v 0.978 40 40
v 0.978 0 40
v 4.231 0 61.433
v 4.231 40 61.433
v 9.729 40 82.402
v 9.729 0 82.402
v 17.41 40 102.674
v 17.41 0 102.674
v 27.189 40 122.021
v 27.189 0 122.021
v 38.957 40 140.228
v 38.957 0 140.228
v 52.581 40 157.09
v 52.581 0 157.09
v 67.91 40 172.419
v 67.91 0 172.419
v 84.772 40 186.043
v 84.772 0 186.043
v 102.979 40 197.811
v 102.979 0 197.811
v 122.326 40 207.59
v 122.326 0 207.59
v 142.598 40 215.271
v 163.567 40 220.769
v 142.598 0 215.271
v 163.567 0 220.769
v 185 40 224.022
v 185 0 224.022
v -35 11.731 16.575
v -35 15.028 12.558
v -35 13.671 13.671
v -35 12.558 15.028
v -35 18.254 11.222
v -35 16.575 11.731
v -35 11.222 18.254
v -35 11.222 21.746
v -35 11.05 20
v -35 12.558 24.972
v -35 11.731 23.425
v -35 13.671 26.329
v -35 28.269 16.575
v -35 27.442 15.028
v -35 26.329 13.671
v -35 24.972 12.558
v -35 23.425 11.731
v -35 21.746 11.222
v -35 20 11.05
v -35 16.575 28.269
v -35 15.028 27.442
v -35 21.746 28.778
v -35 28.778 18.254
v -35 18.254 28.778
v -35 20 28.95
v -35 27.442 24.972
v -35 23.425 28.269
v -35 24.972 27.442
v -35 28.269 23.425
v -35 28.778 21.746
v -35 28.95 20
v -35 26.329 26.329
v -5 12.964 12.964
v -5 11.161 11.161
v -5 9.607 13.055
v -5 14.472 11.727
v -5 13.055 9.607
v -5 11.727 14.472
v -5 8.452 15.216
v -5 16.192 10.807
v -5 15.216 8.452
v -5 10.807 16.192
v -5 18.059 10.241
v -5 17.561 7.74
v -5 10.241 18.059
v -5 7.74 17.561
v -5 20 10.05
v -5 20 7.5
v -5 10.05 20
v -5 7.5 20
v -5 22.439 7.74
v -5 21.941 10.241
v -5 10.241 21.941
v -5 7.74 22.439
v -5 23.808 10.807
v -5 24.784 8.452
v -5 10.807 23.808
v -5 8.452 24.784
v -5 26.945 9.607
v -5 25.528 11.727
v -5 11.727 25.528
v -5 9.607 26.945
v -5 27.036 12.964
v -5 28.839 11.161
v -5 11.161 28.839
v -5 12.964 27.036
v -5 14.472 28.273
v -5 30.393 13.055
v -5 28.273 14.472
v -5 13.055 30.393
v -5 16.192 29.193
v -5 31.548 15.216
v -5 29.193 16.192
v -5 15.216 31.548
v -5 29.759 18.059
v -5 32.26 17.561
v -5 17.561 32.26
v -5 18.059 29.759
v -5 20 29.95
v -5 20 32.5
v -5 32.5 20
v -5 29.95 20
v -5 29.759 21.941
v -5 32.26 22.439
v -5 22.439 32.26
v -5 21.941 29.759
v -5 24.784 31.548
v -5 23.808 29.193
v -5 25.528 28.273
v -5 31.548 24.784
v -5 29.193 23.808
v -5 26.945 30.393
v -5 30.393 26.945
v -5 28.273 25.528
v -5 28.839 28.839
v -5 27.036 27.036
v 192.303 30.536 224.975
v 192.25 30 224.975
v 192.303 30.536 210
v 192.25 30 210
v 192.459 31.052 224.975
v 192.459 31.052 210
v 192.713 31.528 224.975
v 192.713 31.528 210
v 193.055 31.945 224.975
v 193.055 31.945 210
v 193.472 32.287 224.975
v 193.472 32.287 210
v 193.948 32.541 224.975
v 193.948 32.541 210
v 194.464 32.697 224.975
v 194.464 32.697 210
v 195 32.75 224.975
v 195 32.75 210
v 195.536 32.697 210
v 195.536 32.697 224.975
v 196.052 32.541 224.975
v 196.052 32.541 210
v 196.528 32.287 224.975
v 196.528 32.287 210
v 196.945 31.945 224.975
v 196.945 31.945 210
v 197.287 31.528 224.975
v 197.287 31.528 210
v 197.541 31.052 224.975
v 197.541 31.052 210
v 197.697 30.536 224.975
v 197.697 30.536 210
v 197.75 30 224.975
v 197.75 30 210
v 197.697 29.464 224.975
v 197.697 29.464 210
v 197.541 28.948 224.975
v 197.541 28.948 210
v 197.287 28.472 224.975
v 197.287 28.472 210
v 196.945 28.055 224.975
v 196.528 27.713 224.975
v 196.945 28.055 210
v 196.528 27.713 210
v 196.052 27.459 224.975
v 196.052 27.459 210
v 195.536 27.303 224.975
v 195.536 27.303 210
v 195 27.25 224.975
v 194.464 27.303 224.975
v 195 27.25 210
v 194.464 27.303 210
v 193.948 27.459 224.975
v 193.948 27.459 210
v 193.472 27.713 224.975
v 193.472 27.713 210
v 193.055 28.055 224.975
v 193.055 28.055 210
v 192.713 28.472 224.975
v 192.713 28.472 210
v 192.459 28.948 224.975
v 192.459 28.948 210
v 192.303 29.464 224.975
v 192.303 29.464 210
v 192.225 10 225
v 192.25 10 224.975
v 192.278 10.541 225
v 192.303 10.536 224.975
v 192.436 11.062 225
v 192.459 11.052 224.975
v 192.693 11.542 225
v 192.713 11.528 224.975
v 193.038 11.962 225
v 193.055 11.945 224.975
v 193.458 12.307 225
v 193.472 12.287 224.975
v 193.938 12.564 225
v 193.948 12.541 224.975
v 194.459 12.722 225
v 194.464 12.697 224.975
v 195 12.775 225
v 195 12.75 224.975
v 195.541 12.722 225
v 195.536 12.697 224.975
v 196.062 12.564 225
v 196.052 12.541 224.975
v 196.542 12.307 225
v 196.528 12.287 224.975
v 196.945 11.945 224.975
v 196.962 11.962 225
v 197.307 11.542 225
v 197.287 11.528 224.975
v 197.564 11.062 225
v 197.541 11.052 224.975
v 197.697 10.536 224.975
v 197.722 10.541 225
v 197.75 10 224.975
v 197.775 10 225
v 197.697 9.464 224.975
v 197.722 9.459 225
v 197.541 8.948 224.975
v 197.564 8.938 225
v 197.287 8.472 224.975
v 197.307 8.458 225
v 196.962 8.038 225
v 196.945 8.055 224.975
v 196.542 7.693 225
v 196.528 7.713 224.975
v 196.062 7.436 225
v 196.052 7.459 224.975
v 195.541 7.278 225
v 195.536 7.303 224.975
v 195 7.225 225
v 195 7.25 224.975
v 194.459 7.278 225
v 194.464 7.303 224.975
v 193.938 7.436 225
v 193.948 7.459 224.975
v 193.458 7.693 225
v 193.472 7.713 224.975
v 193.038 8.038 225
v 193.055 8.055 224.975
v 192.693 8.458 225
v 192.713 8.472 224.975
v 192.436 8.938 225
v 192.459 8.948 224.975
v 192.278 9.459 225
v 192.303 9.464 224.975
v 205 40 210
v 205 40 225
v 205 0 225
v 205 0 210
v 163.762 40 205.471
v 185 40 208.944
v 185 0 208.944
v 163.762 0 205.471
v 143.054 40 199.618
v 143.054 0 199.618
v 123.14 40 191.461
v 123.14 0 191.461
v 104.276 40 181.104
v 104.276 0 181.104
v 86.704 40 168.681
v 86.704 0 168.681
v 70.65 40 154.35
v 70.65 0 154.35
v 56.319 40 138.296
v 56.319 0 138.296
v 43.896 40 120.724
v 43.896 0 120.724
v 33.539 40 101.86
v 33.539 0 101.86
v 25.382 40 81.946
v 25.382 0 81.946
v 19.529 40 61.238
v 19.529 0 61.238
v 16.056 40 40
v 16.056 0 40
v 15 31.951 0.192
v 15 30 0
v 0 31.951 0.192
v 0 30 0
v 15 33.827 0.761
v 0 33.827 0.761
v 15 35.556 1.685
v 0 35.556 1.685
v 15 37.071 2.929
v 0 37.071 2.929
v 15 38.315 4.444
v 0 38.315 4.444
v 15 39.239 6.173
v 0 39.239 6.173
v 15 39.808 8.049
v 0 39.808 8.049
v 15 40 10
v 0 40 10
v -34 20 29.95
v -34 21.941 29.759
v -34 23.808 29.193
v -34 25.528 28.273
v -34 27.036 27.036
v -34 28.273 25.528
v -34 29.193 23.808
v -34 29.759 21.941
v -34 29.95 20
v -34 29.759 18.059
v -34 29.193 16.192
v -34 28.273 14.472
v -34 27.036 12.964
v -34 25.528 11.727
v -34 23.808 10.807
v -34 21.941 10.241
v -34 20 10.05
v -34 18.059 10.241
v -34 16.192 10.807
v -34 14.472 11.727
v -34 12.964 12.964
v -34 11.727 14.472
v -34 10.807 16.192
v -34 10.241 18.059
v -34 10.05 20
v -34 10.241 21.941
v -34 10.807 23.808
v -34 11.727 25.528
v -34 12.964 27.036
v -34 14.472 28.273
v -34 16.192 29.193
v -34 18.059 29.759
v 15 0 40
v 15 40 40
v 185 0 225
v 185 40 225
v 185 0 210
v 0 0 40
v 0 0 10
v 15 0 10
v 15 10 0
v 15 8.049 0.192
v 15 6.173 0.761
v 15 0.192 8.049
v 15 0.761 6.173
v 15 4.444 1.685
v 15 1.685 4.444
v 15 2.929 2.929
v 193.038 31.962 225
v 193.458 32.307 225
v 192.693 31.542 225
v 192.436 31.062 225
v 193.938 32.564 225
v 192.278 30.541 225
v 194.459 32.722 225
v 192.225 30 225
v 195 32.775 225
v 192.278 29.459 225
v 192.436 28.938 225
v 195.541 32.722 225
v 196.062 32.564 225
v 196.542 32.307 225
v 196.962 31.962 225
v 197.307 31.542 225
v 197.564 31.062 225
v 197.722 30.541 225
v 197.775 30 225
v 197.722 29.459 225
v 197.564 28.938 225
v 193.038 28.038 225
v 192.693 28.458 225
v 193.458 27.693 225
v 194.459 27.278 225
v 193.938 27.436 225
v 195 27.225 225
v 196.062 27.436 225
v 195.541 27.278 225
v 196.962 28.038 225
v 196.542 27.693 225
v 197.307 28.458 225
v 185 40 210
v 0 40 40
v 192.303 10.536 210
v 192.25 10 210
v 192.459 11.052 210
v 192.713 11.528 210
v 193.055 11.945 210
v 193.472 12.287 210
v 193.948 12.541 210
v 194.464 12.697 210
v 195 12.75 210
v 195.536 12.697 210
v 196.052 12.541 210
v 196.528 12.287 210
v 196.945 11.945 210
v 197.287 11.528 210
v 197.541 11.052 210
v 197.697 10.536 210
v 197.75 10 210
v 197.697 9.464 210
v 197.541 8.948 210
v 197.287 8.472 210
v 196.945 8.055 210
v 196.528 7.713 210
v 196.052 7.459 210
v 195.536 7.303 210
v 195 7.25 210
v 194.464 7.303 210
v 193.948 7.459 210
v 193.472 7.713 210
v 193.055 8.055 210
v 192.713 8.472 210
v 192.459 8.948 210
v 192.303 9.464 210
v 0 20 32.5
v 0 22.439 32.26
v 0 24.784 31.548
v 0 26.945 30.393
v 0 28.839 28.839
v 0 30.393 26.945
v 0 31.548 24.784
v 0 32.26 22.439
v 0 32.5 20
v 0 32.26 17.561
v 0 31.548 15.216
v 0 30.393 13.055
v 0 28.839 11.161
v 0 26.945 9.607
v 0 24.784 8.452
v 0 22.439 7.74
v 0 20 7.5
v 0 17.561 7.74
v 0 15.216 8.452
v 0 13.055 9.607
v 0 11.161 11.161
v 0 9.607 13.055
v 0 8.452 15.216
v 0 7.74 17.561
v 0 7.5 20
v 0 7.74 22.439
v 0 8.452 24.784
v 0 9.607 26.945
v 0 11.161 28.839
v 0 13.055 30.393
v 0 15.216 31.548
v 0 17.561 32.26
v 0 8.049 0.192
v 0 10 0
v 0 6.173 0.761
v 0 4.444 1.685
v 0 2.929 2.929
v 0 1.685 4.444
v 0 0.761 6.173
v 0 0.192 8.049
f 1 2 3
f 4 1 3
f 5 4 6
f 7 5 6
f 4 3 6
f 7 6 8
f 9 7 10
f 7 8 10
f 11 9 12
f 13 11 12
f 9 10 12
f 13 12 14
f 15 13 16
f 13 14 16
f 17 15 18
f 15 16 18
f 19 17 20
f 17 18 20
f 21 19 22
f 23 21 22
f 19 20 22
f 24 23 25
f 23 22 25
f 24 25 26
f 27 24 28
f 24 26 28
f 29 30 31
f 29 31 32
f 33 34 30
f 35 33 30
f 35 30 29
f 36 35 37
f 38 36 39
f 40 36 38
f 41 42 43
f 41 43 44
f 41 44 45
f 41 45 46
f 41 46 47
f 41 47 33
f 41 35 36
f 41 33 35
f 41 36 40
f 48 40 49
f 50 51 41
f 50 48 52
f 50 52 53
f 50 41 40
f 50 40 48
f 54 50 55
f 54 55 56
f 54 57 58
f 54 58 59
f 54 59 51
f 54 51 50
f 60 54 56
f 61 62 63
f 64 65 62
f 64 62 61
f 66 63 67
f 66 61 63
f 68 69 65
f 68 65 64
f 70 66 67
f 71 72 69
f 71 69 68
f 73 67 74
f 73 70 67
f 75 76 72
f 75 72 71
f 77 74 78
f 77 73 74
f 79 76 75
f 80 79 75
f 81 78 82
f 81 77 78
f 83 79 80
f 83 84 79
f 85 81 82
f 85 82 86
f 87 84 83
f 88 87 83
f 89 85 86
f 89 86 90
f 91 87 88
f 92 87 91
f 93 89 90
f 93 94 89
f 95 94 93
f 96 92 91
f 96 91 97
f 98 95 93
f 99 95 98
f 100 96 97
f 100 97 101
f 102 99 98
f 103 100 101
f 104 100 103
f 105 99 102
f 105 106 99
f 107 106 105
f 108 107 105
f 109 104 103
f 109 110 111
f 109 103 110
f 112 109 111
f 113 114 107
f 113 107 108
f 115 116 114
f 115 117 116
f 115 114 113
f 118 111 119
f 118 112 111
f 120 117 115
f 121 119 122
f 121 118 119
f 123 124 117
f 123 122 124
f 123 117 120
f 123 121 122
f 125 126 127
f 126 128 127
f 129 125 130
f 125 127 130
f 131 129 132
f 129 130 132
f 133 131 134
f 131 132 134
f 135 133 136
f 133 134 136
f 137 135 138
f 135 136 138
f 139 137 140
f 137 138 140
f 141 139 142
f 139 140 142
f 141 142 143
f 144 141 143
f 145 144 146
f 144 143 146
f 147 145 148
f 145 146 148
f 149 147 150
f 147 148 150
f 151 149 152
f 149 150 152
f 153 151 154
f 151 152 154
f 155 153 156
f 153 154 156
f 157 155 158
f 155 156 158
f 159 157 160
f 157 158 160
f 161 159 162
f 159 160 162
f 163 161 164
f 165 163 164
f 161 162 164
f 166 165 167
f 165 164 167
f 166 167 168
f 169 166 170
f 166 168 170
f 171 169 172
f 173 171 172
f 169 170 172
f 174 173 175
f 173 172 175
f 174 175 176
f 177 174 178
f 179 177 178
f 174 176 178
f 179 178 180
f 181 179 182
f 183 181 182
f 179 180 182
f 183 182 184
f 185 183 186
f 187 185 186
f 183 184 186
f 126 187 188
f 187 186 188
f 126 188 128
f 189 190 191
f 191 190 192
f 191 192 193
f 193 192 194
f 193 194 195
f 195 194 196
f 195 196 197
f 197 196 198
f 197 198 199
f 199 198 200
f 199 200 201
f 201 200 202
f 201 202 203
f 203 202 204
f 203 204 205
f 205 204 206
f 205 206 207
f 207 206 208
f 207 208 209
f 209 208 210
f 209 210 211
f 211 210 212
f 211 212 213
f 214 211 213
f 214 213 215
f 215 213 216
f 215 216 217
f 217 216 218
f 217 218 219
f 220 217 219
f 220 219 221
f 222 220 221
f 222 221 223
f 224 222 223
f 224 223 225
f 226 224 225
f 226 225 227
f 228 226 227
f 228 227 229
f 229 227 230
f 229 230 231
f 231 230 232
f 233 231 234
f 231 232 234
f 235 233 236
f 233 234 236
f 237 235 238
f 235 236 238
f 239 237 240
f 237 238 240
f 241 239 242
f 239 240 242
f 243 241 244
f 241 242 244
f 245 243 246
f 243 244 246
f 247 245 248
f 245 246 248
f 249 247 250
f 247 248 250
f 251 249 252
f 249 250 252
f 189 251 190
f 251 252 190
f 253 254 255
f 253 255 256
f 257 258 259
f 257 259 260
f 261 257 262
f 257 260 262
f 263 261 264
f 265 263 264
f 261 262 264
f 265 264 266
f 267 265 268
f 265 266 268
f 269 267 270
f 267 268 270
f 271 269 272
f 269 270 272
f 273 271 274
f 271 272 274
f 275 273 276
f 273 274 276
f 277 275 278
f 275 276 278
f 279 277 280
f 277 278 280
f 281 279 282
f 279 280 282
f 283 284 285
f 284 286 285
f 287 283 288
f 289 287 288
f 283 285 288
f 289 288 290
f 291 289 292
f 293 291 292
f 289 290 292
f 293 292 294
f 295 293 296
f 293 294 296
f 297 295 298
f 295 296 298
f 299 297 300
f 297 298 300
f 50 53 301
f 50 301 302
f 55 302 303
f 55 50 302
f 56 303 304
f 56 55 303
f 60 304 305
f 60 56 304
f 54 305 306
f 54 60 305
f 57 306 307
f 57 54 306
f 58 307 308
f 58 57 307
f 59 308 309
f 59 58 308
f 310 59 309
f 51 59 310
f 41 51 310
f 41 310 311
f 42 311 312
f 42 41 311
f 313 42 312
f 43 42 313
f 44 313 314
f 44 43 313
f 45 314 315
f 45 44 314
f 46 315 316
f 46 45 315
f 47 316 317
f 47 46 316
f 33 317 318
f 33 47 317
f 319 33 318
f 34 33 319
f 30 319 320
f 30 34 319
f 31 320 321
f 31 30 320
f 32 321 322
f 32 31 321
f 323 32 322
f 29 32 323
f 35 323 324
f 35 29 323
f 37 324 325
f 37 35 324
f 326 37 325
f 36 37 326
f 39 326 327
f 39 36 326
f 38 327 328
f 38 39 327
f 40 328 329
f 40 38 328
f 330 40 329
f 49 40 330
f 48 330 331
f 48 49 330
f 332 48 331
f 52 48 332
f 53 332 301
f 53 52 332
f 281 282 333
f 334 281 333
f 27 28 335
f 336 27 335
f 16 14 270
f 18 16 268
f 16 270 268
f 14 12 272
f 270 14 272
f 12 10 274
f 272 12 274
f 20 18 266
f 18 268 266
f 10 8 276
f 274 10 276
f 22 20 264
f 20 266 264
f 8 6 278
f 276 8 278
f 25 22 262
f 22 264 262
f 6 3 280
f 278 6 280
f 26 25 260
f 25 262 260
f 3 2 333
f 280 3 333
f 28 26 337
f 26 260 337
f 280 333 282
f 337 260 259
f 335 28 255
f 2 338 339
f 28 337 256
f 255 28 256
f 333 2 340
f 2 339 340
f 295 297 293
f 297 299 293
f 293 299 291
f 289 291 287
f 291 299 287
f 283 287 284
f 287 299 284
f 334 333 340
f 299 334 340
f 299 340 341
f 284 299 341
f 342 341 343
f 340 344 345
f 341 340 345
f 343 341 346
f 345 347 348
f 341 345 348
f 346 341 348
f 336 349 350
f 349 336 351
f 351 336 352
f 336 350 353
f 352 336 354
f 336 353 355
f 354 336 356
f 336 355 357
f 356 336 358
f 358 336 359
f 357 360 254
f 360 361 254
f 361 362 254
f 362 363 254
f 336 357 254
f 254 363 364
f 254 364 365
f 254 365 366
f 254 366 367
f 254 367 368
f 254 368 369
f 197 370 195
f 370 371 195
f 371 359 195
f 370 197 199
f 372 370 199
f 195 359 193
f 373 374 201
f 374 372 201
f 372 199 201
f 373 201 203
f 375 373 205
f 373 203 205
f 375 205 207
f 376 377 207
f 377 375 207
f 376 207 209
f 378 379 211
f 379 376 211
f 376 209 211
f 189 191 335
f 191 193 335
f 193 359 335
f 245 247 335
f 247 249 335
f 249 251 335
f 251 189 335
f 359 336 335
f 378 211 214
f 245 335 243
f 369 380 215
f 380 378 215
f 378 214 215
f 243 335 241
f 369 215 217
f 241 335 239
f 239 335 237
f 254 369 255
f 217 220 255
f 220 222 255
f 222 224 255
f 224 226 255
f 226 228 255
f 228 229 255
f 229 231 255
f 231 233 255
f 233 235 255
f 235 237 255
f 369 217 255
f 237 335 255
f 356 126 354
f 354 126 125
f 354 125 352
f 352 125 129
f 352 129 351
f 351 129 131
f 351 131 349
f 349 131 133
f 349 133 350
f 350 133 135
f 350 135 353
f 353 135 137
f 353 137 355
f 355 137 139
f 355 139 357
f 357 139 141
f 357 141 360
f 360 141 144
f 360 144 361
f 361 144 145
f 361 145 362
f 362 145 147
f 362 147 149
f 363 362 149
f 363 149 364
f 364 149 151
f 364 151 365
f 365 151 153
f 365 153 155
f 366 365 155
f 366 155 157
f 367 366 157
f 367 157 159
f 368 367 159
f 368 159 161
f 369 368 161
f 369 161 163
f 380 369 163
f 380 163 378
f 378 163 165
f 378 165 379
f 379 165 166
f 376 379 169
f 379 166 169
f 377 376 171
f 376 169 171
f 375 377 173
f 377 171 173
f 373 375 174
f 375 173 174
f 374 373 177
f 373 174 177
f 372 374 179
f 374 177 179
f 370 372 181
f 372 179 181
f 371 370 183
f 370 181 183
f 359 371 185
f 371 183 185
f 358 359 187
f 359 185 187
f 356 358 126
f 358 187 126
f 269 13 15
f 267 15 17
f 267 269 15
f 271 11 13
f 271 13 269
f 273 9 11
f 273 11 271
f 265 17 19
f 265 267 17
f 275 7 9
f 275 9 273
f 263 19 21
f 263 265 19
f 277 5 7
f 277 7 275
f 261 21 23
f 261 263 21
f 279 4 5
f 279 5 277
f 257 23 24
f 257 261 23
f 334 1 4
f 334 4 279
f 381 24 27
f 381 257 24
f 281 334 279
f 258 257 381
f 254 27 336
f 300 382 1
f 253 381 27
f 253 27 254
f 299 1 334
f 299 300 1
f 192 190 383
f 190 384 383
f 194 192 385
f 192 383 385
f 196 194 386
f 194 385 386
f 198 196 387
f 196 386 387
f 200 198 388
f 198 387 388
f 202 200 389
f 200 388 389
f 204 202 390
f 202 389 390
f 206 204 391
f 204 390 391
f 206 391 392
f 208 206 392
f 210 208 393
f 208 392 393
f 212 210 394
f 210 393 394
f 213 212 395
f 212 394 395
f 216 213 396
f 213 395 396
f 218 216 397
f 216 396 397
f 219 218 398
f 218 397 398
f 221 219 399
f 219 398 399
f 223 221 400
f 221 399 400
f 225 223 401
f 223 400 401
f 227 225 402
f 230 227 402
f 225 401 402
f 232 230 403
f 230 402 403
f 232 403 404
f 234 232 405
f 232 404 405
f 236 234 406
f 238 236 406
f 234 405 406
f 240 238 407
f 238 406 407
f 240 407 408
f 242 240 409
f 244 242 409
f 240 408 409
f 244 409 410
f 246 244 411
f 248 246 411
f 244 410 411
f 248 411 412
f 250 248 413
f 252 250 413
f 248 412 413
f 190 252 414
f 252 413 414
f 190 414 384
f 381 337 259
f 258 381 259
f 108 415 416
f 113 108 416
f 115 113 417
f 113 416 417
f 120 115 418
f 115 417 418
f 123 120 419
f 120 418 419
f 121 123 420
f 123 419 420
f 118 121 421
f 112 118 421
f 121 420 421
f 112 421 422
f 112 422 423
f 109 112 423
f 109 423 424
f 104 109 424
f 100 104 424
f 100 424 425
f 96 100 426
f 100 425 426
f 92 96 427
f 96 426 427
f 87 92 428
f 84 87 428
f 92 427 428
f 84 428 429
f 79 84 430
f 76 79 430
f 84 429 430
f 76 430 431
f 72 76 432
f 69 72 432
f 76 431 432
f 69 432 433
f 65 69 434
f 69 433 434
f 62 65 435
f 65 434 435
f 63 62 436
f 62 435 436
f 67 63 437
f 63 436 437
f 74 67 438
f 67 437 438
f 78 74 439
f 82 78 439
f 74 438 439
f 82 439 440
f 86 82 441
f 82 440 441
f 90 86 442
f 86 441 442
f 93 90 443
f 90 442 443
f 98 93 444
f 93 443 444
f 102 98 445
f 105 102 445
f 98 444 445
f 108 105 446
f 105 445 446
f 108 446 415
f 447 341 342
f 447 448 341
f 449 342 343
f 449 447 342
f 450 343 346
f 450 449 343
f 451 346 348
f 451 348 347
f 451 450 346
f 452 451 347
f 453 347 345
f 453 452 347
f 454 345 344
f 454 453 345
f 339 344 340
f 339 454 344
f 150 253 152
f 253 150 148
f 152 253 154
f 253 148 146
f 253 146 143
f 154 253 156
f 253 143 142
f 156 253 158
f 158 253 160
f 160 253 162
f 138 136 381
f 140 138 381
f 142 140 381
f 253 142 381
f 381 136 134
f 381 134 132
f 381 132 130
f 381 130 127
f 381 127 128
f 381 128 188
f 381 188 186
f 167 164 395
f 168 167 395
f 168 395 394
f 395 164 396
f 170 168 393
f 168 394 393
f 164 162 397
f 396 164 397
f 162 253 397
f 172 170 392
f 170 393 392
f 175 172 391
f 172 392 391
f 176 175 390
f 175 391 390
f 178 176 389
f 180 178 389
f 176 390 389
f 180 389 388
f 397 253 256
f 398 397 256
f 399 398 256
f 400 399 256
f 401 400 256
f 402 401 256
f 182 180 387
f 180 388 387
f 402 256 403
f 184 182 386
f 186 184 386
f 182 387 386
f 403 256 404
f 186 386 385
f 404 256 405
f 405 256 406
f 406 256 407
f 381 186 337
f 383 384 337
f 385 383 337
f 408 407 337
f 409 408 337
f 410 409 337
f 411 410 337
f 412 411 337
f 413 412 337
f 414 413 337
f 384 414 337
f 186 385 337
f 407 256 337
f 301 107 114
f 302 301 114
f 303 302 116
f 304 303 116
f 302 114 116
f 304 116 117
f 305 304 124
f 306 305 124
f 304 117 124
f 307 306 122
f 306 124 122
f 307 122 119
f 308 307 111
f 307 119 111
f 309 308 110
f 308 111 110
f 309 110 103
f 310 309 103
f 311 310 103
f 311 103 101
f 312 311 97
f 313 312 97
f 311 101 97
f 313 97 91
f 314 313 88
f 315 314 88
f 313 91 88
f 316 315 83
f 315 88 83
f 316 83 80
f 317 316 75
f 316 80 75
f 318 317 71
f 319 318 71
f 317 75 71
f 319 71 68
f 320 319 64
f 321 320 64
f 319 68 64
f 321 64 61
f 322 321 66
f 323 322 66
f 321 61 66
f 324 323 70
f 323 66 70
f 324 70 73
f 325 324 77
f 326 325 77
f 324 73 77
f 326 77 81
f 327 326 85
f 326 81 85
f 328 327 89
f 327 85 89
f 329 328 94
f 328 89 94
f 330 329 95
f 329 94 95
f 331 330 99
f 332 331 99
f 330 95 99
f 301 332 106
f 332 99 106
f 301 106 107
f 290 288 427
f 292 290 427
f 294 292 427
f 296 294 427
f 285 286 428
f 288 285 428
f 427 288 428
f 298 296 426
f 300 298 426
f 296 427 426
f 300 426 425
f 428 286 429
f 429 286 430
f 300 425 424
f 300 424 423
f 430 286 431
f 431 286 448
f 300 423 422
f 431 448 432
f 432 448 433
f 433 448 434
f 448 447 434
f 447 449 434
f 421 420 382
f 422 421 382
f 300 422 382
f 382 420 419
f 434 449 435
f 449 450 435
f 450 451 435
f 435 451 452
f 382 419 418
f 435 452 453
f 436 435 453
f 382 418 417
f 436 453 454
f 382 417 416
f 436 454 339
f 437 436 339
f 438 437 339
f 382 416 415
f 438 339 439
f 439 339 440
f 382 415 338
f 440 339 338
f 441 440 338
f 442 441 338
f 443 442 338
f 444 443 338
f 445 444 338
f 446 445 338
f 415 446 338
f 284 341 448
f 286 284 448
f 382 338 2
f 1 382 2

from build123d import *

# Parameters (mm, degrees)
BOSS_EXTRUDE4_DEPTH            = 40
SKETCH18_R                     = 12.5
BOSS_EXTRUDE2_DEPTH            = 5
SKETCH19_R                     = 9.95
BOSS_EXTRUDE3_DEPTH            = 30
FILLET1_R                      = 10
M5_CLEARANCE_HOLE1_D           = 5.5
M5_CLEARANCE_HOLE1_CSINK_D     = 5.55
M5_CLEARANCE_HOLE1_CSINK_ANGLE = 90
CHAMFER1_SIZE                  = 1


with BuildPart() as part:
    # Sketch20 → Boss-Extrude4 (new body)
    with BuildSketch(Plane(origin=(0, 0, 0), x_dir=(1, 0, 0), z_dir=(0, 1, 0))):
        with BuildLine():
            Line((0, 0), (0, -20))
            Line((0, -20), (0, -40))
            Line((0, -40), (0.977942369, -40))
            ThreePointArc((0.977942369, -40), (60.043109857, -164.956890143), (185, -224.022057631))
            Line((185, -224.022057631), (185, -225))
            Line((185, -225), (205, -225))
            Line((205, -225), (205, -210))
            Line((205, -210), (185, -210))
            Line((185, -210), (185, -208.944436277))
            ThreePointArc((185, -208.944436277), (70.649711575, -154.350288425), (16.055563723, -40))
            Line((16.055563723, -40), (15, -40))
            Line((15, -40), (15, -20))
            Line((15, -20), (15, 0))
            Line((15, 0), (0, 0))
        make_face()
    extrude(amount=BOSS_EXTRUDE4_DEPTH)

    # Sketch18 → Boss-Extrude2 (add)
    with BuildSketch(Plane.ZY):
        with Locations((20, 20)):
            Circle(SKETCH18_R)
    extrude(amount=BOSS_EXTRUDE2_DEPTH)

    # Sketch19 → Boss-Extrude3 (add)
    with BuildSketch(Plane.ZY.offset(5)):
        with Locations((20, 20)):
            Circle(SKETCH19_R)
    extrude(amount=BOSS_EXTRUDE3_DEPTH)

    # Fillet1
    fillet1_edges = [part.edges().sort_by_distance(p)[0] for p in [
        (7.5, 0, 0),
        (7.5, 40, 0),
    ]]
    fillet(fillet1_edges, radius=FILLET1_R)

    # M5 Clearance Hole1 (through all)
    with Locations(Plane.XY.offset(225)):
        with Locations((195, 30), (195, 10)):
            CounterSinkHole(M5_CLEARANCE_HOLE1_D / 2, M5_CLEARANCE_HOLE1_CSINK_D / 2, counter_sink_angle=M5_CLEARANCE_HOLE1_CSINK_ANGLE)

    # Chamfer1
    chamfer1_edges = [part.edges().sort_by_distance(p)[0] for p in [
        (-35, 20, 10.05),
    ]]
    chamfer(chamfer1_edges, length=CHAMFER1_SIZE)


solid = part.part
